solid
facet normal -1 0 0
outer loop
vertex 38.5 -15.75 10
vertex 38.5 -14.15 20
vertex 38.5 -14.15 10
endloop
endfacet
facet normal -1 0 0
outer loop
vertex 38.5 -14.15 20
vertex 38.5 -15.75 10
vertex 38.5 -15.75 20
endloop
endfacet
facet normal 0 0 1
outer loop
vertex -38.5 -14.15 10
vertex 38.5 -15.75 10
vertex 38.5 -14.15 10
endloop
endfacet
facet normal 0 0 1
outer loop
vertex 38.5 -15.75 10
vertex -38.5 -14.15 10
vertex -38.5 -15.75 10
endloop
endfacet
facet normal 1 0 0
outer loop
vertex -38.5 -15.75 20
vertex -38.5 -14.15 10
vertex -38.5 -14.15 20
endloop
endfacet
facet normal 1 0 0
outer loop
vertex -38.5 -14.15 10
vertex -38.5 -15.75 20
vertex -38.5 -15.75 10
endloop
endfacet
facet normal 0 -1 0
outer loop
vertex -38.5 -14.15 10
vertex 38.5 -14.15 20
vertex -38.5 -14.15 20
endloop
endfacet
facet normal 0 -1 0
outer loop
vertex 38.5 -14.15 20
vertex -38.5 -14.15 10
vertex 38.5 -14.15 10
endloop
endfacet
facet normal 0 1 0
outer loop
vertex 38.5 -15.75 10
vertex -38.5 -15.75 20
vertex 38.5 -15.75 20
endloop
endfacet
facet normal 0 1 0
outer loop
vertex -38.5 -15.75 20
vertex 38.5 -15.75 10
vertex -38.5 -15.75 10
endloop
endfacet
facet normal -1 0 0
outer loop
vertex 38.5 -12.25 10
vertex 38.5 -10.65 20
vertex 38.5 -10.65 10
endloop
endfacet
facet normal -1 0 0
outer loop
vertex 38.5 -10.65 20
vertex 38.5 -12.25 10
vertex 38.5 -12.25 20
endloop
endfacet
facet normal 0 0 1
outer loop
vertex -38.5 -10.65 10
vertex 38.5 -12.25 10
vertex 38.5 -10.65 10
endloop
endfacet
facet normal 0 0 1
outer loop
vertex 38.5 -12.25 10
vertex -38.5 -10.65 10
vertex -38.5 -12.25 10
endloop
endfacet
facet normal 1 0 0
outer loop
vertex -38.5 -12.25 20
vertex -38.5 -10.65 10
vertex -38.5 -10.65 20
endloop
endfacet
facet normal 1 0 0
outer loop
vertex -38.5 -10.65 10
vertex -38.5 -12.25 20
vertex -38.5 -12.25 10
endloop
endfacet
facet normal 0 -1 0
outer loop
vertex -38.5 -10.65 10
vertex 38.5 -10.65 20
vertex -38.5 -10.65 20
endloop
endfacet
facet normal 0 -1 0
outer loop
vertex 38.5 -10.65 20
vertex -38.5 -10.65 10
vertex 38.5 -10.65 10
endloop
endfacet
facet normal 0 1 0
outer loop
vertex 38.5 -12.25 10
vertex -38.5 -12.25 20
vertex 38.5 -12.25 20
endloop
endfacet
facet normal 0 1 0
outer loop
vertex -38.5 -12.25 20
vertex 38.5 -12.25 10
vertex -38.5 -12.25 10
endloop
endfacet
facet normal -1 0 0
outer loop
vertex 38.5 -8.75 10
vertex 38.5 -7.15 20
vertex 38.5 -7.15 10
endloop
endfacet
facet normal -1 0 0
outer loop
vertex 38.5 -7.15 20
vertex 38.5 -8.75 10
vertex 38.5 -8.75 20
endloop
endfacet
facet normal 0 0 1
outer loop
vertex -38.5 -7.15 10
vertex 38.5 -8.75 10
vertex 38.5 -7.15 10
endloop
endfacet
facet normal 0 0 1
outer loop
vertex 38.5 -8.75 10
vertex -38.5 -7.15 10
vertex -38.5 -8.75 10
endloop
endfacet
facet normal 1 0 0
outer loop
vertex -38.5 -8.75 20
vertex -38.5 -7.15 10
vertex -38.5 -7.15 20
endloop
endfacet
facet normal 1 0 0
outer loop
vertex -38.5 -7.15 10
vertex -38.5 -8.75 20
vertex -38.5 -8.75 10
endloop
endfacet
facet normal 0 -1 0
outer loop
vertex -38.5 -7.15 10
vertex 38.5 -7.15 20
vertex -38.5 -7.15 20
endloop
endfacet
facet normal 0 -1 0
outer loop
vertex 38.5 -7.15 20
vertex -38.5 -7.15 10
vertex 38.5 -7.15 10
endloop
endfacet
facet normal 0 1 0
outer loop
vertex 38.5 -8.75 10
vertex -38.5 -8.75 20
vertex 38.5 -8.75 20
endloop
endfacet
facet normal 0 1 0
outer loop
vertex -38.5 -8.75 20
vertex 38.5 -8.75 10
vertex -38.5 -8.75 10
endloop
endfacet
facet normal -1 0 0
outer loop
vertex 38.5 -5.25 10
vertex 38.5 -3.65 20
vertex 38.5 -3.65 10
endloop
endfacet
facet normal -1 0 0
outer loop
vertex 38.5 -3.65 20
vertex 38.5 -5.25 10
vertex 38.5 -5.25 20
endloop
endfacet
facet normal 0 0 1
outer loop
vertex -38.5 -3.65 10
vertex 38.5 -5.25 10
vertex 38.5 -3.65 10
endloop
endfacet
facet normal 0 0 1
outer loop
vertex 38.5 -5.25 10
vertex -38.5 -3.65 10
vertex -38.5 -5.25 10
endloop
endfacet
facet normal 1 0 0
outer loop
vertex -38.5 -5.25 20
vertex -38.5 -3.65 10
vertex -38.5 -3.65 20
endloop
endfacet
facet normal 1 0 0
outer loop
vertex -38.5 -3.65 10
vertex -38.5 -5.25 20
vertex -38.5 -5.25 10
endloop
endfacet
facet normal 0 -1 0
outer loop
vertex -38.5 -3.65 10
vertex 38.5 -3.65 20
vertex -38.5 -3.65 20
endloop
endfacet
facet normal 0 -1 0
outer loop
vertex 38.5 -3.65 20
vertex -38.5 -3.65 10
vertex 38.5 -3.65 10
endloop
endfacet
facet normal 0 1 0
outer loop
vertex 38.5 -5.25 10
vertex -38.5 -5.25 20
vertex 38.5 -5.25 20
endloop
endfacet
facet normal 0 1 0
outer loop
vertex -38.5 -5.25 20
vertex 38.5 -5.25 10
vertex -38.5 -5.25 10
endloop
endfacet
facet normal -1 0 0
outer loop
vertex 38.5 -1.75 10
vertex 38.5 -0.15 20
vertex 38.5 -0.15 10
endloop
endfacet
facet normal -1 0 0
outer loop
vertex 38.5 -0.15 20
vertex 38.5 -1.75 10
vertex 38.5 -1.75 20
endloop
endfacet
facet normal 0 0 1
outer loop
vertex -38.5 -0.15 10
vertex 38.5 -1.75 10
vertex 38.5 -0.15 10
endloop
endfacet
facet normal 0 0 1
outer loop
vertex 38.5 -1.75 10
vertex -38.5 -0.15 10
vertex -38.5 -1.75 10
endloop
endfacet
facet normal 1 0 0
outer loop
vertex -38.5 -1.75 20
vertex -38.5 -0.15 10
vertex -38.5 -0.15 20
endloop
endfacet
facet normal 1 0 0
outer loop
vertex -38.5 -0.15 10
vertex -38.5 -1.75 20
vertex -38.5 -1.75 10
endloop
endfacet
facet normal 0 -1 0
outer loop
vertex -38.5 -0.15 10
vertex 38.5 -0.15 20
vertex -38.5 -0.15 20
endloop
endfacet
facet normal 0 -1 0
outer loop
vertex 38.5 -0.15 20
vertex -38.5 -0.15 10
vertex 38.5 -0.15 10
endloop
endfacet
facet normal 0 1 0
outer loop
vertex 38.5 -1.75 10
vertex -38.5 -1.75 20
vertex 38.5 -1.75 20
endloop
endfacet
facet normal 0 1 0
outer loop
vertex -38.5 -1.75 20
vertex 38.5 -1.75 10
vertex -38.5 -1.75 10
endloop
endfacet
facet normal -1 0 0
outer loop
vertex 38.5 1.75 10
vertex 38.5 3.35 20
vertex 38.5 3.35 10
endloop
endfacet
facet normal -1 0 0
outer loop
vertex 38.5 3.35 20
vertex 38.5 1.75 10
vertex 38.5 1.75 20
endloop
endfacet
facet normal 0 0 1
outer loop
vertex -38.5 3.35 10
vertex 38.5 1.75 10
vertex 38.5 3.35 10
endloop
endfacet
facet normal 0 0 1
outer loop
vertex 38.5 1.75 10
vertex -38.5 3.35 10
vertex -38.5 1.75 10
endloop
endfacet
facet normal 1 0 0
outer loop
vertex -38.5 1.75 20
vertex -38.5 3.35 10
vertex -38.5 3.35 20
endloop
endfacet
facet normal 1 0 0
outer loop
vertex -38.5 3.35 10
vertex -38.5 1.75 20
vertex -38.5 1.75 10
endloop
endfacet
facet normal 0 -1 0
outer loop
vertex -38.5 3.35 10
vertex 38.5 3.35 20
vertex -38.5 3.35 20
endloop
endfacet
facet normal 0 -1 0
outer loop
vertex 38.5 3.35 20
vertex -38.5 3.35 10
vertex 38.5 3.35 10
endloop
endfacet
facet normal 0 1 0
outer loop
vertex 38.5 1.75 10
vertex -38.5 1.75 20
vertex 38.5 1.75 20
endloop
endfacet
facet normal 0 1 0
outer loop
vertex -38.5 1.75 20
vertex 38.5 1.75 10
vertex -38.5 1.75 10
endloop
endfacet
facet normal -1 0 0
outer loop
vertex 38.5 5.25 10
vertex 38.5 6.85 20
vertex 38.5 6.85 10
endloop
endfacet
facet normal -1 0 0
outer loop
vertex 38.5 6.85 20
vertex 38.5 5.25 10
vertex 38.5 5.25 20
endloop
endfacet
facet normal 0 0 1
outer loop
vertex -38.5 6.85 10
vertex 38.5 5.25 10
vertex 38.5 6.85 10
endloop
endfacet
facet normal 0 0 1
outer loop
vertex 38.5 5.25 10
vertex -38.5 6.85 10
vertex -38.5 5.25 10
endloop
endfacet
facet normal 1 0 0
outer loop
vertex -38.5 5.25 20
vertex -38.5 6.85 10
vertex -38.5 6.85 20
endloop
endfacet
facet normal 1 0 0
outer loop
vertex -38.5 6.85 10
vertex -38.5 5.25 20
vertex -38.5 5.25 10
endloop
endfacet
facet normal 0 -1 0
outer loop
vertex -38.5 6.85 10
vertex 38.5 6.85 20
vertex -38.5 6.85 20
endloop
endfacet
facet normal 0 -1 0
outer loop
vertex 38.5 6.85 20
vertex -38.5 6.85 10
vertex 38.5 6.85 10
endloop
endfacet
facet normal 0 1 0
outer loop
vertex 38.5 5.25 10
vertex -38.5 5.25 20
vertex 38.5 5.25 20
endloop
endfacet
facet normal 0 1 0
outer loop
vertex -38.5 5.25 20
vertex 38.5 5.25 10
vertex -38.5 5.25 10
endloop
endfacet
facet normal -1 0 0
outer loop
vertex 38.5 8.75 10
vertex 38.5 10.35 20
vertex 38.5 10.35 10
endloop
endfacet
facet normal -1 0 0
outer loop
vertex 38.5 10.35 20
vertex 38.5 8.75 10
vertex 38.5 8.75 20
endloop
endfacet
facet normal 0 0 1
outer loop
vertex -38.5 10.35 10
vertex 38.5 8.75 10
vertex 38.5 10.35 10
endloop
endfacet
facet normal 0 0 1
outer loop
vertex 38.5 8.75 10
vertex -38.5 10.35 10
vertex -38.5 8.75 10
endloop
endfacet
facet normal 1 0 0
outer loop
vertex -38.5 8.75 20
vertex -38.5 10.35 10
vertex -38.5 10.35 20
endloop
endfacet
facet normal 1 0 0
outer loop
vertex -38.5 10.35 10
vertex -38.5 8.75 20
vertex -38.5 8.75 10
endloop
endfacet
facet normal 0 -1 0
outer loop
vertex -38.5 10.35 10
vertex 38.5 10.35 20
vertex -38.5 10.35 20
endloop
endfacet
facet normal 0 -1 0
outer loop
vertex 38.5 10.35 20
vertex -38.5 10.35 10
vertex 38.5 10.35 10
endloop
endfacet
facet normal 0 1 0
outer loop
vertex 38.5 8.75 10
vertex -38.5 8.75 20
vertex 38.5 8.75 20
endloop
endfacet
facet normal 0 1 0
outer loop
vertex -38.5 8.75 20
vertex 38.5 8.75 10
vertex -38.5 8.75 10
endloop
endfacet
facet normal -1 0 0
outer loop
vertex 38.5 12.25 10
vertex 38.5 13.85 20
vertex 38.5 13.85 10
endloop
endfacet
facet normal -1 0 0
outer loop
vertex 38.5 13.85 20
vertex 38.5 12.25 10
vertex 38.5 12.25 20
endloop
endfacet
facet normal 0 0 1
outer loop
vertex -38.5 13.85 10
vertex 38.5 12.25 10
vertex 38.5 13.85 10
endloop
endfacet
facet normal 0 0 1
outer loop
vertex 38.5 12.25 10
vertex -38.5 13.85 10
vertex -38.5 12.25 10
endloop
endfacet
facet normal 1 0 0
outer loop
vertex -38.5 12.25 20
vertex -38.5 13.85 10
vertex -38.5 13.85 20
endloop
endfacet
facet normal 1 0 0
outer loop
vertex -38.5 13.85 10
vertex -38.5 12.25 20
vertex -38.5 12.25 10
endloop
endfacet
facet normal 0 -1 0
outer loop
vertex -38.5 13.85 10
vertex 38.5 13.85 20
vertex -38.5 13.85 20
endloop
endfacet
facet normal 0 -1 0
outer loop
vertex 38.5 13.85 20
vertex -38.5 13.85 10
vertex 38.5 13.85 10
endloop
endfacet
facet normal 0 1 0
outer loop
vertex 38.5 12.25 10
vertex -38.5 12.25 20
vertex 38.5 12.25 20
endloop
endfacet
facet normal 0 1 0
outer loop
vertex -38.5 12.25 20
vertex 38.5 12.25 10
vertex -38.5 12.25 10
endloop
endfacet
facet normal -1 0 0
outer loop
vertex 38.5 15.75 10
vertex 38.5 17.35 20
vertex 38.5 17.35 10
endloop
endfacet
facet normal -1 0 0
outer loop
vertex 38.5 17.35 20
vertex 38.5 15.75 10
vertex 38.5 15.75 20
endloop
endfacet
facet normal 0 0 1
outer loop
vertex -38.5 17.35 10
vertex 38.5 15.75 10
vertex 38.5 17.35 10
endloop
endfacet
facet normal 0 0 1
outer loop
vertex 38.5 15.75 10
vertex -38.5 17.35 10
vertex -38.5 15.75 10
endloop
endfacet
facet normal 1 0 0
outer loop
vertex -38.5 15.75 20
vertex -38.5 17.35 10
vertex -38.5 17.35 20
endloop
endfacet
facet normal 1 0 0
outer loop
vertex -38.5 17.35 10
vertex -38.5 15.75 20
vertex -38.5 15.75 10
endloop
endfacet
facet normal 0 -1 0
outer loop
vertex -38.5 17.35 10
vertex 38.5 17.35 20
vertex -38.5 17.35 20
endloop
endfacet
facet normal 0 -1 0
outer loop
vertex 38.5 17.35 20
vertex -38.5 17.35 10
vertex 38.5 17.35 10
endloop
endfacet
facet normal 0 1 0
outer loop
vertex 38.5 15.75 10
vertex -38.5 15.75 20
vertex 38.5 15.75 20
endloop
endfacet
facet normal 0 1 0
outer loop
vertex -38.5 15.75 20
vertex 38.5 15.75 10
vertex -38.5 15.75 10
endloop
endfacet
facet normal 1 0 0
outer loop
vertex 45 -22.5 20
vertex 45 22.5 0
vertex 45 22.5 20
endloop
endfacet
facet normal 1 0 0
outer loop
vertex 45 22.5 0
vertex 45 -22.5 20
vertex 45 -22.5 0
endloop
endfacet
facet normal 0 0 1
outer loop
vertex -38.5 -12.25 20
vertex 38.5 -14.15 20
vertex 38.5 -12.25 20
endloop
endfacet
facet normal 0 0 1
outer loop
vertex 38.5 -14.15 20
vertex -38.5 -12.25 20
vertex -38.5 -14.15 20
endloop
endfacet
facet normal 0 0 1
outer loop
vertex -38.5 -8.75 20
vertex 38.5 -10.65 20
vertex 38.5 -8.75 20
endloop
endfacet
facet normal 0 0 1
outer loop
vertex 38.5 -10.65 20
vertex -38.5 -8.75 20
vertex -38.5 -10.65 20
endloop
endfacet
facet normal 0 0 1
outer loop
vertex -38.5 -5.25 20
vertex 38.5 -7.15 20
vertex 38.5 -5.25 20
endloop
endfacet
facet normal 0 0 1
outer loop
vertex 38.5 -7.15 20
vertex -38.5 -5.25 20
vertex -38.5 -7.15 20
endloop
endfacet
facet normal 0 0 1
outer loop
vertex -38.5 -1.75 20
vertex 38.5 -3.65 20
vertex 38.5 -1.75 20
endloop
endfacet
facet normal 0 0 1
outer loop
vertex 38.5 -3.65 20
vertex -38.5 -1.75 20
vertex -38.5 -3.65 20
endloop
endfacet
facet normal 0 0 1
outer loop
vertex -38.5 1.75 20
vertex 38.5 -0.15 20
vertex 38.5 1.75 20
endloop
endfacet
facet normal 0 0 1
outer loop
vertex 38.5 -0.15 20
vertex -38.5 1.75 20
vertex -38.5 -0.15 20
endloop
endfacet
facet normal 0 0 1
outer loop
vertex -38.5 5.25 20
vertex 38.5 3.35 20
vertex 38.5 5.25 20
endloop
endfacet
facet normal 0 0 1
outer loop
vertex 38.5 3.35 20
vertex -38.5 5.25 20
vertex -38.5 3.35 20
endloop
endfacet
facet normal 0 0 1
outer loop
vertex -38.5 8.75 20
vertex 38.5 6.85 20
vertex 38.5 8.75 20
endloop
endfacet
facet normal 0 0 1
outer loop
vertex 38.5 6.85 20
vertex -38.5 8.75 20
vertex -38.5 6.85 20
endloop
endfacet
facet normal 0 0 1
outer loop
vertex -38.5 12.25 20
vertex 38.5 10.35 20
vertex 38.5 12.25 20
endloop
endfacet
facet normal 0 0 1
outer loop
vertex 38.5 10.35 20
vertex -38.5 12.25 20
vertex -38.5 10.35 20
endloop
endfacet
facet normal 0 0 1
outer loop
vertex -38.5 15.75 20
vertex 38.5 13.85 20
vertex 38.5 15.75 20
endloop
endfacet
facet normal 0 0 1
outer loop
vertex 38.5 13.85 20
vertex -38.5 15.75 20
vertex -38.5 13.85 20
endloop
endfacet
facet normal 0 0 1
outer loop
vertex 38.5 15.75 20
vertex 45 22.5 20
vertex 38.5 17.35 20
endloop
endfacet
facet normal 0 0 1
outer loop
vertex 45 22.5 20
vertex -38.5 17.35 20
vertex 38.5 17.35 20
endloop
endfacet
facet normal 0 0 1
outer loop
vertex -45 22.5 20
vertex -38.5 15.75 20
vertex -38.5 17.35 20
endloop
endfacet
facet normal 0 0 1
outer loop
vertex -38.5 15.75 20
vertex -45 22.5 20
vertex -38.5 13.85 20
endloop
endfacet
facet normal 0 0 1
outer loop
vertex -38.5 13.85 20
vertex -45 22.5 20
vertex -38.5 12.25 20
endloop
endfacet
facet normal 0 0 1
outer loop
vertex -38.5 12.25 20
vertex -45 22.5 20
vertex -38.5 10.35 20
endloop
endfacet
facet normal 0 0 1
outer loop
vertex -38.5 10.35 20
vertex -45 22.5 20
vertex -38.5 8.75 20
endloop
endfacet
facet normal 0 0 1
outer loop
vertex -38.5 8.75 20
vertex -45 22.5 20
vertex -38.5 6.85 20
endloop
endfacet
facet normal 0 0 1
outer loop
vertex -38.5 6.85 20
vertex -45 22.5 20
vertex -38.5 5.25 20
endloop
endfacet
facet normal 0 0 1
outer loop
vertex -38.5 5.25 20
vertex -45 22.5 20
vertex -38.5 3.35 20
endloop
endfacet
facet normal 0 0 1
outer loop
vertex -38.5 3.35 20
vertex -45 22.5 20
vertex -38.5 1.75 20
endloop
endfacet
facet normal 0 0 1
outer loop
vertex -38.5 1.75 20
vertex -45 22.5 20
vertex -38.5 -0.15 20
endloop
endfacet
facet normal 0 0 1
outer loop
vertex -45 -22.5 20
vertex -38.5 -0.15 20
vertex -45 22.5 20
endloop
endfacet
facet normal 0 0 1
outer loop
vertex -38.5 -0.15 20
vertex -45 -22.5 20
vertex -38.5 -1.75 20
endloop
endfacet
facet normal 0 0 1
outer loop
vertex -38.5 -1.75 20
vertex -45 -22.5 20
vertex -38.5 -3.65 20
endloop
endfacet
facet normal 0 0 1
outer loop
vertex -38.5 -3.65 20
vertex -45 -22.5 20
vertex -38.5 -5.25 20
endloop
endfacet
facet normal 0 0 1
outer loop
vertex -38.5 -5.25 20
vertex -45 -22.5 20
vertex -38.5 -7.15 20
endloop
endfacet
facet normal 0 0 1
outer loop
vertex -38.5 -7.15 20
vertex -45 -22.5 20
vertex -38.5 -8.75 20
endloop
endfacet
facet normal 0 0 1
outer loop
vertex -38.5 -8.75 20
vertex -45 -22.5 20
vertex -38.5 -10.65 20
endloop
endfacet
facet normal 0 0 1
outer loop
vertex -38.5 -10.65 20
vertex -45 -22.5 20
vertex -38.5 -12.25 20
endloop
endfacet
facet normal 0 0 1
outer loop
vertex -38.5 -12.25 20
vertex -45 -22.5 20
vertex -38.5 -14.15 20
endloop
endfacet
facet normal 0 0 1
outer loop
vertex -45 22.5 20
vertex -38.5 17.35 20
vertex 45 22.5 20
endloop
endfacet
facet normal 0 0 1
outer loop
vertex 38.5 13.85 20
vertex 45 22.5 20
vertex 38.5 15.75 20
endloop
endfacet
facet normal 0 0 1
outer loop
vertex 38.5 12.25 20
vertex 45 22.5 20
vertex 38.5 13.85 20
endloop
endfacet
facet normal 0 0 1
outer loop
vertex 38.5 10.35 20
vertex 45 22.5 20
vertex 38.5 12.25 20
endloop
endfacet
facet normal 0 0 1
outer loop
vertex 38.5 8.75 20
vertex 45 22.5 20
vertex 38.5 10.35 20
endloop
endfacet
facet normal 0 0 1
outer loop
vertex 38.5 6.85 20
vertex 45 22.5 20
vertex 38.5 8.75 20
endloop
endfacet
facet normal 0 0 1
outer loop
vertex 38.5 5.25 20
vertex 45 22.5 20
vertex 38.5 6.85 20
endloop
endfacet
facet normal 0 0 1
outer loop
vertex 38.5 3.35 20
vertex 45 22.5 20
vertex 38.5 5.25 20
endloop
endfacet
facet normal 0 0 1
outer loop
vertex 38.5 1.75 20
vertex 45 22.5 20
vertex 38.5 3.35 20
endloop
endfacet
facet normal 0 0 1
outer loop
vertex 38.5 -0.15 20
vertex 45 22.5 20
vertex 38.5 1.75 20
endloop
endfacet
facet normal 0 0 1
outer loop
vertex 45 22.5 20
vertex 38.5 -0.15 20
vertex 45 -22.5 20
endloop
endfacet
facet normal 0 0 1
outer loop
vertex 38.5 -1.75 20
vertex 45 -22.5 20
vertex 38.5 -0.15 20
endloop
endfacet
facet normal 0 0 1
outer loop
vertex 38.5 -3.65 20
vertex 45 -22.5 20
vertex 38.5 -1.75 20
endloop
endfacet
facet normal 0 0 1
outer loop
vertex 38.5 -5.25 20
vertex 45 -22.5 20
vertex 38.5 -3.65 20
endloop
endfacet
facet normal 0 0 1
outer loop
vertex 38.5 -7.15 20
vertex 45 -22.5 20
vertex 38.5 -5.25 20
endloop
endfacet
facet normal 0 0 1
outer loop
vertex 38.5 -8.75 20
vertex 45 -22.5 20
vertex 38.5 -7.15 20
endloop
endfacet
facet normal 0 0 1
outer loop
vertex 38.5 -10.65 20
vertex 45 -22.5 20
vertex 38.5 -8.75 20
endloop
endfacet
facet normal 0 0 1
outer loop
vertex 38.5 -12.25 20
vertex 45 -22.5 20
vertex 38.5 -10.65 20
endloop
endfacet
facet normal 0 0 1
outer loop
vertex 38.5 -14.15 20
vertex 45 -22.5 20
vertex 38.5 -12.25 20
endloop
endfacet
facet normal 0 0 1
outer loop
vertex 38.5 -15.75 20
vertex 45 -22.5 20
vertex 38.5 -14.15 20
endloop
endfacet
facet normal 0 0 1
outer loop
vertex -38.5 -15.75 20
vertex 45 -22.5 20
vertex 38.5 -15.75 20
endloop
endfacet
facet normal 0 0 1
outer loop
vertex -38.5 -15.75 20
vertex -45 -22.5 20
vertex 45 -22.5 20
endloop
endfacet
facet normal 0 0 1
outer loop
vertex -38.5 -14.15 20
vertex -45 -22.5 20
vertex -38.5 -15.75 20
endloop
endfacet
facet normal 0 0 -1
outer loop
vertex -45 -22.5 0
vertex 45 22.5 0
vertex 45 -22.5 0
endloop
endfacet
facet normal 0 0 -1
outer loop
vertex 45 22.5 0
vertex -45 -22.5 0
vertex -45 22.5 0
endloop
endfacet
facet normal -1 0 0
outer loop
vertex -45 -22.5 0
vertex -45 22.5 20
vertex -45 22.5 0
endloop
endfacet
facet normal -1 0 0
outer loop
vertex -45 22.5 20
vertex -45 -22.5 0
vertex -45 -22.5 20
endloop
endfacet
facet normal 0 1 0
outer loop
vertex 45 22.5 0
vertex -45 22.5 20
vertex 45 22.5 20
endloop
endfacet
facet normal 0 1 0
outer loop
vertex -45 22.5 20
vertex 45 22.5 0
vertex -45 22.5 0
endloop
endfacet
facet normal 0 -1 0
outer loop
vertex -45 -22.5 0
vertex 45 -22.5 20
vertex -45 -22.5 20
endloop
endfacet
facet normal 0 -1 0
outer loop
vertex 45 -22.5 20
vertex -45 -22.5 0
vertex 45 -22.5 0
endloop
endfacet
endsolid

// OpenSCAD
// Microscope slide drying rack
// Print orientation: base block on the bed (z = 0), slots open upward.

// ---------------- Parameters ----------------
block_len    = 90;    // block length along X (mm)
block_wid    = 45;    // block width along Y (mm)
block_h      = 20;    // block height along Z (mm)

slot_len     = 77;    // slot length along X (mm)
slot_w       = 1.6;   // slot width along Y (mm)
slot_depth   = 10;    // slot depth from top face (mm)
slot_count   = 10;    // number of slots
slot_pitch   = 3.5;   // centre-to-centre spacing in Y (mm)

eps          = 0.5;   // overshoot so cutters pass the top face

$fn = 64;

// ---------------- Model ----------------
difference() {
    // Base block, centred in X and Y, sitting on z = 0
    translate([-block_len/2, -block_wid/2, 0])
        cube([block_len, block_wid, block_h]);

    // Slot group, centred on the block in X and Y
    for (i = [0 : slot_count - 1]) {
        y = (i - (slot_count - 1)/2) * slot_pitch;
        translate([-slot_len/2, y, block_h - slot_depth])
            cube([slot_len, slot_w, slot_depth + eps]);
    }
}
